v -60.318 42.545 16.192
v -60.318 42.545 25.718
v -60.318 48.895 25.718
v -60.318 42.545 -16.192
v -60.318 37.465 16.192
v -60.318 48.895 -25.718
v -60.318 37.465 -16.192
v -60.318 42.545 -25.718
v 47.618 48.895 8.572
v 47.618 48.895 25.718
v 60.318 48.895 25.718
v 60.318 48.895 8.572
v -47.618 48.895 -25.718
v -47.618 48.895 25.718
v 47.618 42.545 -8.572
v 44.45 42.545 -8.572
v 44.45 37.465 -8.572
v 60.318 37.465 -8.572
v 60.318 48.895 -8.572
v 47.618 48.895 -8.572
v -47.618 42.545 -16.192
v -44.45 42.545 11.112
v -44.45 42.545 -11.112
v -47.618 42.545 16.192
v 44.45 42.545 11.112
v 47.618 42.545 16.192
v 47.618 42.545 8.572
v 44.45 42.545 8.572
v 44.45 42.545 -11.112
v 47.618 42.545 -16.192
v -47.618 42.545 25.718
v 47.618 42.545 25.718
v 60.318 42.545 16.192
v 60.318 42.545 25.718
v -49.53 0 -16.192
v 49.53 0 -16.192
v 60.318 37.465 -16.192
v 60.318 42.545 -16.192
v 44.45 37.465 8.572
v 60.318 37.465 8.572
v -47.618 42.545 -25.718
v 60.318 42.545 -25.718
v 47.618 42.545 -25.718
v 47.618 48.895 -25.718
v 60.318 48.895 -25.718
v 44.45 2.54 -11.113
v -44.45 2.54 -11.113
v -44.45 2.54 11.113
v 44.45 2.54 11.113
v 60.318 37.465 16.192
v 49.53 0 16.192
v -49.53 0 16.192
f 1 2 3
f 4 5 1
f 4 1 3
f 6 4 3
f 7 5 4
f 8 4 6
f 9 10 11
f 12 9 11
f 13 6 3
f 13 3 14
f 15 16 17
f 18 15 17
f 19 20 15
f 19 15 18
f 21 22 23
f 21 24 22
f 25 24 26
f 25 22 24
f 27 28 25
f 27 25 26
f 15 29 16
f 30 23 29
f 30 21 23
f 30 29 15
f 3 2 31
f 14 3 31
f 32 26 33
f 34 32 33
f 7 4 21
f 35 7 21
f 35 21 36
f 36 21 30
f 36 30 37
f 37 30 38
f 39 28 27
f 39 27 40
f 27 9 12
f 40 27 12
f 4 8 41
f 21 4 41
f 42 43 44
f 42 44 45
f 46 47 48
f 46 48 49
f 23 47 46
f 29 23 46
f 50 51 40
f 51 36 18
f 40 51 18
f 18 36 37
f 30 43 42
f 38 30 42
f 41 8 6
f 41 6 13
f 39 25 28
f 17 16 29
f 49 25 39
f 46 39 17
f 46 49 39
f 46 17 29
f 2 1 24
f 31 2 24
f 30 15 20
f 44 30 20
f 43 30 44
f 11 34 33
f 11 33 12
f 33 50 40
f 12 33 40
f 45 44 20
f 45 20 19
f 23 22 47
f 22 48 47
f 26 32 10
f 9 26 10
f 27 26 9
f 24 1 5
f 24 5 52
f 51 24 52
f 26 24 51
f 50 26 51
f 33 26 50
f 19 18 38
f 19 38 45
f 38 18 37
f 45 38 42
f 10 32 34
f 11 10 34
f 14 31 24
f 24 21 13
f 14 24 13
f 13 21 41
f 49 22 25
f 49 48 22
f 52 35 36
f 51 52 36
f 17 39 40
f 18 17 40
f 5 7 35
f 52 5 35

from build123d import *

# Parameters (mm, degrees)
SKETCH1_W                = 88.9
SKETCH1_H                = 22.225
BOSS_EXTRUDE1_DEPTH      = 2.54
SKETCH2_W                = 99.06
SKETCH2_H                = 32.385
SKETCH2_W_2              = 88.9
SKETCH2_H_2              = 22.225
BOSS_EXTRUDE3_DEPTH      = 34.925
BOSS_EXTRUDE3_DEPTH_BACK = 2.54
SKETCH4_W                = 120.635507722
SKETCH4_H                = 32.385
SKETCH4_W_2              = 88.9
SKETCH4_H_2              = 22.225
BOSS_EXTRUDE4_DEPTH      = 5.08
SKETCH5_W                = 12.7
SKETCH5_H                = 51.435
BOSS_EXTRUDE5_DEPTH      = 6.35
BOSS_EXTRUDE6_DEPTH      = 32.385
SKETCH7_W                = 15.867753861
SKETCH7_H                = 17.145
CUT_EXTRUDE1_DEPTH       = 11.43


with BuildPart() as part:
    # Sketch1 → Boss-Extrude1 (new body)
    with BuildSketch(Plane(origin=(0, 0, 0), x_dir=(1, 0, 0), z_dir=(0, 1, 0))):
        Rectangle(SKETCH1_W, SKETCH1_H)
    extrude(amount=BOSS_EXTRUDE1_DEPTH)

    # Sketch2 → Boss-Extrude3 (add, two sides)
    with BuildSketch(Plane(origin=(0, 2.54, 0), x_dir=(1, 0, 0), z_dir=(0, 1, 0))) as boss_extrude3_sk:
        Rectangle(SKETCH2_W, SKETCH2_H)
        Rectangle(SKETCH2_W_2, SKETCH2_H_2, mode=Mode.SUBTRACT)
    extrude(amount=BOSS_EXTRUDE3_DEPTH)
    extrude(boss_extrude3_sk.sketch, amount=-BOSS_EXTRUDE3_DEPTH_BACK)

    # Sketch4 → Boss-Extrude4 (add)
    with BuildSketch(Plane(origin=(0, 37.465, 0), x_dir=(1, 0, 0), z_dir=(0, 1, 0))):
        Rectangle(SKETCH4_W, SKETCH4_H)
        Rectangle(SKETCH4_W_2, SKETCH4_H_2, mode=Mode.SUBTRACT)
    extrude(amount=BOSS_EXTRUDE4_DEPTH)

    # Sketch5 → Boss-Extrude5 (add)
    with BuildSketch(Plane(origin=(0, 42.545, 0), x_dir=(1, 0, 0), z_dir=(0, 1, 0))):
        with Locations((53.967753861, 0)):
            Rectangle(SKETCH5_W, SKETCH5_H)
        with Locations((-53.967753861, 0)):
            Rectangle(SKETCH5_W, SKETCH5_H)
    extrude(amount=BOSS_EXTRUDE5_DEPTH)

    # Sketch6 → Boss-Extrude6 (add)
    with BuildSketch(Plane(origin=(0, 0, -16.1925), x_dir=(-1, 0, 0), z_dir=(0, 0, -1))):
        Polygon((-49.53, 0), (-60.317753861, 37.465), (-49.53, 37.465), align=None)
        Polygon((49.53, 37.465), (60.317753861, 37.465), (49.53, 0), align=None)
    extrude(amount=-BOSS_EXTRUDE6_DEPTH)

    # Sketch7 → Cut-Extrude1 (cut)
    with BuildSketch(Plane(origin=(0, 48.895, 0), x_dir=(1, 0, 0), z_dir=(0, 1, 0))):
        with Locations((52.383876931, 0)):
            Rectangle(SKETCH7_W, SKETCH7_H)
    extrude(amount=-CUT_EXTRUDE1_DEPTH, mode=Mode.SUBTRACT)


solid = part.part
